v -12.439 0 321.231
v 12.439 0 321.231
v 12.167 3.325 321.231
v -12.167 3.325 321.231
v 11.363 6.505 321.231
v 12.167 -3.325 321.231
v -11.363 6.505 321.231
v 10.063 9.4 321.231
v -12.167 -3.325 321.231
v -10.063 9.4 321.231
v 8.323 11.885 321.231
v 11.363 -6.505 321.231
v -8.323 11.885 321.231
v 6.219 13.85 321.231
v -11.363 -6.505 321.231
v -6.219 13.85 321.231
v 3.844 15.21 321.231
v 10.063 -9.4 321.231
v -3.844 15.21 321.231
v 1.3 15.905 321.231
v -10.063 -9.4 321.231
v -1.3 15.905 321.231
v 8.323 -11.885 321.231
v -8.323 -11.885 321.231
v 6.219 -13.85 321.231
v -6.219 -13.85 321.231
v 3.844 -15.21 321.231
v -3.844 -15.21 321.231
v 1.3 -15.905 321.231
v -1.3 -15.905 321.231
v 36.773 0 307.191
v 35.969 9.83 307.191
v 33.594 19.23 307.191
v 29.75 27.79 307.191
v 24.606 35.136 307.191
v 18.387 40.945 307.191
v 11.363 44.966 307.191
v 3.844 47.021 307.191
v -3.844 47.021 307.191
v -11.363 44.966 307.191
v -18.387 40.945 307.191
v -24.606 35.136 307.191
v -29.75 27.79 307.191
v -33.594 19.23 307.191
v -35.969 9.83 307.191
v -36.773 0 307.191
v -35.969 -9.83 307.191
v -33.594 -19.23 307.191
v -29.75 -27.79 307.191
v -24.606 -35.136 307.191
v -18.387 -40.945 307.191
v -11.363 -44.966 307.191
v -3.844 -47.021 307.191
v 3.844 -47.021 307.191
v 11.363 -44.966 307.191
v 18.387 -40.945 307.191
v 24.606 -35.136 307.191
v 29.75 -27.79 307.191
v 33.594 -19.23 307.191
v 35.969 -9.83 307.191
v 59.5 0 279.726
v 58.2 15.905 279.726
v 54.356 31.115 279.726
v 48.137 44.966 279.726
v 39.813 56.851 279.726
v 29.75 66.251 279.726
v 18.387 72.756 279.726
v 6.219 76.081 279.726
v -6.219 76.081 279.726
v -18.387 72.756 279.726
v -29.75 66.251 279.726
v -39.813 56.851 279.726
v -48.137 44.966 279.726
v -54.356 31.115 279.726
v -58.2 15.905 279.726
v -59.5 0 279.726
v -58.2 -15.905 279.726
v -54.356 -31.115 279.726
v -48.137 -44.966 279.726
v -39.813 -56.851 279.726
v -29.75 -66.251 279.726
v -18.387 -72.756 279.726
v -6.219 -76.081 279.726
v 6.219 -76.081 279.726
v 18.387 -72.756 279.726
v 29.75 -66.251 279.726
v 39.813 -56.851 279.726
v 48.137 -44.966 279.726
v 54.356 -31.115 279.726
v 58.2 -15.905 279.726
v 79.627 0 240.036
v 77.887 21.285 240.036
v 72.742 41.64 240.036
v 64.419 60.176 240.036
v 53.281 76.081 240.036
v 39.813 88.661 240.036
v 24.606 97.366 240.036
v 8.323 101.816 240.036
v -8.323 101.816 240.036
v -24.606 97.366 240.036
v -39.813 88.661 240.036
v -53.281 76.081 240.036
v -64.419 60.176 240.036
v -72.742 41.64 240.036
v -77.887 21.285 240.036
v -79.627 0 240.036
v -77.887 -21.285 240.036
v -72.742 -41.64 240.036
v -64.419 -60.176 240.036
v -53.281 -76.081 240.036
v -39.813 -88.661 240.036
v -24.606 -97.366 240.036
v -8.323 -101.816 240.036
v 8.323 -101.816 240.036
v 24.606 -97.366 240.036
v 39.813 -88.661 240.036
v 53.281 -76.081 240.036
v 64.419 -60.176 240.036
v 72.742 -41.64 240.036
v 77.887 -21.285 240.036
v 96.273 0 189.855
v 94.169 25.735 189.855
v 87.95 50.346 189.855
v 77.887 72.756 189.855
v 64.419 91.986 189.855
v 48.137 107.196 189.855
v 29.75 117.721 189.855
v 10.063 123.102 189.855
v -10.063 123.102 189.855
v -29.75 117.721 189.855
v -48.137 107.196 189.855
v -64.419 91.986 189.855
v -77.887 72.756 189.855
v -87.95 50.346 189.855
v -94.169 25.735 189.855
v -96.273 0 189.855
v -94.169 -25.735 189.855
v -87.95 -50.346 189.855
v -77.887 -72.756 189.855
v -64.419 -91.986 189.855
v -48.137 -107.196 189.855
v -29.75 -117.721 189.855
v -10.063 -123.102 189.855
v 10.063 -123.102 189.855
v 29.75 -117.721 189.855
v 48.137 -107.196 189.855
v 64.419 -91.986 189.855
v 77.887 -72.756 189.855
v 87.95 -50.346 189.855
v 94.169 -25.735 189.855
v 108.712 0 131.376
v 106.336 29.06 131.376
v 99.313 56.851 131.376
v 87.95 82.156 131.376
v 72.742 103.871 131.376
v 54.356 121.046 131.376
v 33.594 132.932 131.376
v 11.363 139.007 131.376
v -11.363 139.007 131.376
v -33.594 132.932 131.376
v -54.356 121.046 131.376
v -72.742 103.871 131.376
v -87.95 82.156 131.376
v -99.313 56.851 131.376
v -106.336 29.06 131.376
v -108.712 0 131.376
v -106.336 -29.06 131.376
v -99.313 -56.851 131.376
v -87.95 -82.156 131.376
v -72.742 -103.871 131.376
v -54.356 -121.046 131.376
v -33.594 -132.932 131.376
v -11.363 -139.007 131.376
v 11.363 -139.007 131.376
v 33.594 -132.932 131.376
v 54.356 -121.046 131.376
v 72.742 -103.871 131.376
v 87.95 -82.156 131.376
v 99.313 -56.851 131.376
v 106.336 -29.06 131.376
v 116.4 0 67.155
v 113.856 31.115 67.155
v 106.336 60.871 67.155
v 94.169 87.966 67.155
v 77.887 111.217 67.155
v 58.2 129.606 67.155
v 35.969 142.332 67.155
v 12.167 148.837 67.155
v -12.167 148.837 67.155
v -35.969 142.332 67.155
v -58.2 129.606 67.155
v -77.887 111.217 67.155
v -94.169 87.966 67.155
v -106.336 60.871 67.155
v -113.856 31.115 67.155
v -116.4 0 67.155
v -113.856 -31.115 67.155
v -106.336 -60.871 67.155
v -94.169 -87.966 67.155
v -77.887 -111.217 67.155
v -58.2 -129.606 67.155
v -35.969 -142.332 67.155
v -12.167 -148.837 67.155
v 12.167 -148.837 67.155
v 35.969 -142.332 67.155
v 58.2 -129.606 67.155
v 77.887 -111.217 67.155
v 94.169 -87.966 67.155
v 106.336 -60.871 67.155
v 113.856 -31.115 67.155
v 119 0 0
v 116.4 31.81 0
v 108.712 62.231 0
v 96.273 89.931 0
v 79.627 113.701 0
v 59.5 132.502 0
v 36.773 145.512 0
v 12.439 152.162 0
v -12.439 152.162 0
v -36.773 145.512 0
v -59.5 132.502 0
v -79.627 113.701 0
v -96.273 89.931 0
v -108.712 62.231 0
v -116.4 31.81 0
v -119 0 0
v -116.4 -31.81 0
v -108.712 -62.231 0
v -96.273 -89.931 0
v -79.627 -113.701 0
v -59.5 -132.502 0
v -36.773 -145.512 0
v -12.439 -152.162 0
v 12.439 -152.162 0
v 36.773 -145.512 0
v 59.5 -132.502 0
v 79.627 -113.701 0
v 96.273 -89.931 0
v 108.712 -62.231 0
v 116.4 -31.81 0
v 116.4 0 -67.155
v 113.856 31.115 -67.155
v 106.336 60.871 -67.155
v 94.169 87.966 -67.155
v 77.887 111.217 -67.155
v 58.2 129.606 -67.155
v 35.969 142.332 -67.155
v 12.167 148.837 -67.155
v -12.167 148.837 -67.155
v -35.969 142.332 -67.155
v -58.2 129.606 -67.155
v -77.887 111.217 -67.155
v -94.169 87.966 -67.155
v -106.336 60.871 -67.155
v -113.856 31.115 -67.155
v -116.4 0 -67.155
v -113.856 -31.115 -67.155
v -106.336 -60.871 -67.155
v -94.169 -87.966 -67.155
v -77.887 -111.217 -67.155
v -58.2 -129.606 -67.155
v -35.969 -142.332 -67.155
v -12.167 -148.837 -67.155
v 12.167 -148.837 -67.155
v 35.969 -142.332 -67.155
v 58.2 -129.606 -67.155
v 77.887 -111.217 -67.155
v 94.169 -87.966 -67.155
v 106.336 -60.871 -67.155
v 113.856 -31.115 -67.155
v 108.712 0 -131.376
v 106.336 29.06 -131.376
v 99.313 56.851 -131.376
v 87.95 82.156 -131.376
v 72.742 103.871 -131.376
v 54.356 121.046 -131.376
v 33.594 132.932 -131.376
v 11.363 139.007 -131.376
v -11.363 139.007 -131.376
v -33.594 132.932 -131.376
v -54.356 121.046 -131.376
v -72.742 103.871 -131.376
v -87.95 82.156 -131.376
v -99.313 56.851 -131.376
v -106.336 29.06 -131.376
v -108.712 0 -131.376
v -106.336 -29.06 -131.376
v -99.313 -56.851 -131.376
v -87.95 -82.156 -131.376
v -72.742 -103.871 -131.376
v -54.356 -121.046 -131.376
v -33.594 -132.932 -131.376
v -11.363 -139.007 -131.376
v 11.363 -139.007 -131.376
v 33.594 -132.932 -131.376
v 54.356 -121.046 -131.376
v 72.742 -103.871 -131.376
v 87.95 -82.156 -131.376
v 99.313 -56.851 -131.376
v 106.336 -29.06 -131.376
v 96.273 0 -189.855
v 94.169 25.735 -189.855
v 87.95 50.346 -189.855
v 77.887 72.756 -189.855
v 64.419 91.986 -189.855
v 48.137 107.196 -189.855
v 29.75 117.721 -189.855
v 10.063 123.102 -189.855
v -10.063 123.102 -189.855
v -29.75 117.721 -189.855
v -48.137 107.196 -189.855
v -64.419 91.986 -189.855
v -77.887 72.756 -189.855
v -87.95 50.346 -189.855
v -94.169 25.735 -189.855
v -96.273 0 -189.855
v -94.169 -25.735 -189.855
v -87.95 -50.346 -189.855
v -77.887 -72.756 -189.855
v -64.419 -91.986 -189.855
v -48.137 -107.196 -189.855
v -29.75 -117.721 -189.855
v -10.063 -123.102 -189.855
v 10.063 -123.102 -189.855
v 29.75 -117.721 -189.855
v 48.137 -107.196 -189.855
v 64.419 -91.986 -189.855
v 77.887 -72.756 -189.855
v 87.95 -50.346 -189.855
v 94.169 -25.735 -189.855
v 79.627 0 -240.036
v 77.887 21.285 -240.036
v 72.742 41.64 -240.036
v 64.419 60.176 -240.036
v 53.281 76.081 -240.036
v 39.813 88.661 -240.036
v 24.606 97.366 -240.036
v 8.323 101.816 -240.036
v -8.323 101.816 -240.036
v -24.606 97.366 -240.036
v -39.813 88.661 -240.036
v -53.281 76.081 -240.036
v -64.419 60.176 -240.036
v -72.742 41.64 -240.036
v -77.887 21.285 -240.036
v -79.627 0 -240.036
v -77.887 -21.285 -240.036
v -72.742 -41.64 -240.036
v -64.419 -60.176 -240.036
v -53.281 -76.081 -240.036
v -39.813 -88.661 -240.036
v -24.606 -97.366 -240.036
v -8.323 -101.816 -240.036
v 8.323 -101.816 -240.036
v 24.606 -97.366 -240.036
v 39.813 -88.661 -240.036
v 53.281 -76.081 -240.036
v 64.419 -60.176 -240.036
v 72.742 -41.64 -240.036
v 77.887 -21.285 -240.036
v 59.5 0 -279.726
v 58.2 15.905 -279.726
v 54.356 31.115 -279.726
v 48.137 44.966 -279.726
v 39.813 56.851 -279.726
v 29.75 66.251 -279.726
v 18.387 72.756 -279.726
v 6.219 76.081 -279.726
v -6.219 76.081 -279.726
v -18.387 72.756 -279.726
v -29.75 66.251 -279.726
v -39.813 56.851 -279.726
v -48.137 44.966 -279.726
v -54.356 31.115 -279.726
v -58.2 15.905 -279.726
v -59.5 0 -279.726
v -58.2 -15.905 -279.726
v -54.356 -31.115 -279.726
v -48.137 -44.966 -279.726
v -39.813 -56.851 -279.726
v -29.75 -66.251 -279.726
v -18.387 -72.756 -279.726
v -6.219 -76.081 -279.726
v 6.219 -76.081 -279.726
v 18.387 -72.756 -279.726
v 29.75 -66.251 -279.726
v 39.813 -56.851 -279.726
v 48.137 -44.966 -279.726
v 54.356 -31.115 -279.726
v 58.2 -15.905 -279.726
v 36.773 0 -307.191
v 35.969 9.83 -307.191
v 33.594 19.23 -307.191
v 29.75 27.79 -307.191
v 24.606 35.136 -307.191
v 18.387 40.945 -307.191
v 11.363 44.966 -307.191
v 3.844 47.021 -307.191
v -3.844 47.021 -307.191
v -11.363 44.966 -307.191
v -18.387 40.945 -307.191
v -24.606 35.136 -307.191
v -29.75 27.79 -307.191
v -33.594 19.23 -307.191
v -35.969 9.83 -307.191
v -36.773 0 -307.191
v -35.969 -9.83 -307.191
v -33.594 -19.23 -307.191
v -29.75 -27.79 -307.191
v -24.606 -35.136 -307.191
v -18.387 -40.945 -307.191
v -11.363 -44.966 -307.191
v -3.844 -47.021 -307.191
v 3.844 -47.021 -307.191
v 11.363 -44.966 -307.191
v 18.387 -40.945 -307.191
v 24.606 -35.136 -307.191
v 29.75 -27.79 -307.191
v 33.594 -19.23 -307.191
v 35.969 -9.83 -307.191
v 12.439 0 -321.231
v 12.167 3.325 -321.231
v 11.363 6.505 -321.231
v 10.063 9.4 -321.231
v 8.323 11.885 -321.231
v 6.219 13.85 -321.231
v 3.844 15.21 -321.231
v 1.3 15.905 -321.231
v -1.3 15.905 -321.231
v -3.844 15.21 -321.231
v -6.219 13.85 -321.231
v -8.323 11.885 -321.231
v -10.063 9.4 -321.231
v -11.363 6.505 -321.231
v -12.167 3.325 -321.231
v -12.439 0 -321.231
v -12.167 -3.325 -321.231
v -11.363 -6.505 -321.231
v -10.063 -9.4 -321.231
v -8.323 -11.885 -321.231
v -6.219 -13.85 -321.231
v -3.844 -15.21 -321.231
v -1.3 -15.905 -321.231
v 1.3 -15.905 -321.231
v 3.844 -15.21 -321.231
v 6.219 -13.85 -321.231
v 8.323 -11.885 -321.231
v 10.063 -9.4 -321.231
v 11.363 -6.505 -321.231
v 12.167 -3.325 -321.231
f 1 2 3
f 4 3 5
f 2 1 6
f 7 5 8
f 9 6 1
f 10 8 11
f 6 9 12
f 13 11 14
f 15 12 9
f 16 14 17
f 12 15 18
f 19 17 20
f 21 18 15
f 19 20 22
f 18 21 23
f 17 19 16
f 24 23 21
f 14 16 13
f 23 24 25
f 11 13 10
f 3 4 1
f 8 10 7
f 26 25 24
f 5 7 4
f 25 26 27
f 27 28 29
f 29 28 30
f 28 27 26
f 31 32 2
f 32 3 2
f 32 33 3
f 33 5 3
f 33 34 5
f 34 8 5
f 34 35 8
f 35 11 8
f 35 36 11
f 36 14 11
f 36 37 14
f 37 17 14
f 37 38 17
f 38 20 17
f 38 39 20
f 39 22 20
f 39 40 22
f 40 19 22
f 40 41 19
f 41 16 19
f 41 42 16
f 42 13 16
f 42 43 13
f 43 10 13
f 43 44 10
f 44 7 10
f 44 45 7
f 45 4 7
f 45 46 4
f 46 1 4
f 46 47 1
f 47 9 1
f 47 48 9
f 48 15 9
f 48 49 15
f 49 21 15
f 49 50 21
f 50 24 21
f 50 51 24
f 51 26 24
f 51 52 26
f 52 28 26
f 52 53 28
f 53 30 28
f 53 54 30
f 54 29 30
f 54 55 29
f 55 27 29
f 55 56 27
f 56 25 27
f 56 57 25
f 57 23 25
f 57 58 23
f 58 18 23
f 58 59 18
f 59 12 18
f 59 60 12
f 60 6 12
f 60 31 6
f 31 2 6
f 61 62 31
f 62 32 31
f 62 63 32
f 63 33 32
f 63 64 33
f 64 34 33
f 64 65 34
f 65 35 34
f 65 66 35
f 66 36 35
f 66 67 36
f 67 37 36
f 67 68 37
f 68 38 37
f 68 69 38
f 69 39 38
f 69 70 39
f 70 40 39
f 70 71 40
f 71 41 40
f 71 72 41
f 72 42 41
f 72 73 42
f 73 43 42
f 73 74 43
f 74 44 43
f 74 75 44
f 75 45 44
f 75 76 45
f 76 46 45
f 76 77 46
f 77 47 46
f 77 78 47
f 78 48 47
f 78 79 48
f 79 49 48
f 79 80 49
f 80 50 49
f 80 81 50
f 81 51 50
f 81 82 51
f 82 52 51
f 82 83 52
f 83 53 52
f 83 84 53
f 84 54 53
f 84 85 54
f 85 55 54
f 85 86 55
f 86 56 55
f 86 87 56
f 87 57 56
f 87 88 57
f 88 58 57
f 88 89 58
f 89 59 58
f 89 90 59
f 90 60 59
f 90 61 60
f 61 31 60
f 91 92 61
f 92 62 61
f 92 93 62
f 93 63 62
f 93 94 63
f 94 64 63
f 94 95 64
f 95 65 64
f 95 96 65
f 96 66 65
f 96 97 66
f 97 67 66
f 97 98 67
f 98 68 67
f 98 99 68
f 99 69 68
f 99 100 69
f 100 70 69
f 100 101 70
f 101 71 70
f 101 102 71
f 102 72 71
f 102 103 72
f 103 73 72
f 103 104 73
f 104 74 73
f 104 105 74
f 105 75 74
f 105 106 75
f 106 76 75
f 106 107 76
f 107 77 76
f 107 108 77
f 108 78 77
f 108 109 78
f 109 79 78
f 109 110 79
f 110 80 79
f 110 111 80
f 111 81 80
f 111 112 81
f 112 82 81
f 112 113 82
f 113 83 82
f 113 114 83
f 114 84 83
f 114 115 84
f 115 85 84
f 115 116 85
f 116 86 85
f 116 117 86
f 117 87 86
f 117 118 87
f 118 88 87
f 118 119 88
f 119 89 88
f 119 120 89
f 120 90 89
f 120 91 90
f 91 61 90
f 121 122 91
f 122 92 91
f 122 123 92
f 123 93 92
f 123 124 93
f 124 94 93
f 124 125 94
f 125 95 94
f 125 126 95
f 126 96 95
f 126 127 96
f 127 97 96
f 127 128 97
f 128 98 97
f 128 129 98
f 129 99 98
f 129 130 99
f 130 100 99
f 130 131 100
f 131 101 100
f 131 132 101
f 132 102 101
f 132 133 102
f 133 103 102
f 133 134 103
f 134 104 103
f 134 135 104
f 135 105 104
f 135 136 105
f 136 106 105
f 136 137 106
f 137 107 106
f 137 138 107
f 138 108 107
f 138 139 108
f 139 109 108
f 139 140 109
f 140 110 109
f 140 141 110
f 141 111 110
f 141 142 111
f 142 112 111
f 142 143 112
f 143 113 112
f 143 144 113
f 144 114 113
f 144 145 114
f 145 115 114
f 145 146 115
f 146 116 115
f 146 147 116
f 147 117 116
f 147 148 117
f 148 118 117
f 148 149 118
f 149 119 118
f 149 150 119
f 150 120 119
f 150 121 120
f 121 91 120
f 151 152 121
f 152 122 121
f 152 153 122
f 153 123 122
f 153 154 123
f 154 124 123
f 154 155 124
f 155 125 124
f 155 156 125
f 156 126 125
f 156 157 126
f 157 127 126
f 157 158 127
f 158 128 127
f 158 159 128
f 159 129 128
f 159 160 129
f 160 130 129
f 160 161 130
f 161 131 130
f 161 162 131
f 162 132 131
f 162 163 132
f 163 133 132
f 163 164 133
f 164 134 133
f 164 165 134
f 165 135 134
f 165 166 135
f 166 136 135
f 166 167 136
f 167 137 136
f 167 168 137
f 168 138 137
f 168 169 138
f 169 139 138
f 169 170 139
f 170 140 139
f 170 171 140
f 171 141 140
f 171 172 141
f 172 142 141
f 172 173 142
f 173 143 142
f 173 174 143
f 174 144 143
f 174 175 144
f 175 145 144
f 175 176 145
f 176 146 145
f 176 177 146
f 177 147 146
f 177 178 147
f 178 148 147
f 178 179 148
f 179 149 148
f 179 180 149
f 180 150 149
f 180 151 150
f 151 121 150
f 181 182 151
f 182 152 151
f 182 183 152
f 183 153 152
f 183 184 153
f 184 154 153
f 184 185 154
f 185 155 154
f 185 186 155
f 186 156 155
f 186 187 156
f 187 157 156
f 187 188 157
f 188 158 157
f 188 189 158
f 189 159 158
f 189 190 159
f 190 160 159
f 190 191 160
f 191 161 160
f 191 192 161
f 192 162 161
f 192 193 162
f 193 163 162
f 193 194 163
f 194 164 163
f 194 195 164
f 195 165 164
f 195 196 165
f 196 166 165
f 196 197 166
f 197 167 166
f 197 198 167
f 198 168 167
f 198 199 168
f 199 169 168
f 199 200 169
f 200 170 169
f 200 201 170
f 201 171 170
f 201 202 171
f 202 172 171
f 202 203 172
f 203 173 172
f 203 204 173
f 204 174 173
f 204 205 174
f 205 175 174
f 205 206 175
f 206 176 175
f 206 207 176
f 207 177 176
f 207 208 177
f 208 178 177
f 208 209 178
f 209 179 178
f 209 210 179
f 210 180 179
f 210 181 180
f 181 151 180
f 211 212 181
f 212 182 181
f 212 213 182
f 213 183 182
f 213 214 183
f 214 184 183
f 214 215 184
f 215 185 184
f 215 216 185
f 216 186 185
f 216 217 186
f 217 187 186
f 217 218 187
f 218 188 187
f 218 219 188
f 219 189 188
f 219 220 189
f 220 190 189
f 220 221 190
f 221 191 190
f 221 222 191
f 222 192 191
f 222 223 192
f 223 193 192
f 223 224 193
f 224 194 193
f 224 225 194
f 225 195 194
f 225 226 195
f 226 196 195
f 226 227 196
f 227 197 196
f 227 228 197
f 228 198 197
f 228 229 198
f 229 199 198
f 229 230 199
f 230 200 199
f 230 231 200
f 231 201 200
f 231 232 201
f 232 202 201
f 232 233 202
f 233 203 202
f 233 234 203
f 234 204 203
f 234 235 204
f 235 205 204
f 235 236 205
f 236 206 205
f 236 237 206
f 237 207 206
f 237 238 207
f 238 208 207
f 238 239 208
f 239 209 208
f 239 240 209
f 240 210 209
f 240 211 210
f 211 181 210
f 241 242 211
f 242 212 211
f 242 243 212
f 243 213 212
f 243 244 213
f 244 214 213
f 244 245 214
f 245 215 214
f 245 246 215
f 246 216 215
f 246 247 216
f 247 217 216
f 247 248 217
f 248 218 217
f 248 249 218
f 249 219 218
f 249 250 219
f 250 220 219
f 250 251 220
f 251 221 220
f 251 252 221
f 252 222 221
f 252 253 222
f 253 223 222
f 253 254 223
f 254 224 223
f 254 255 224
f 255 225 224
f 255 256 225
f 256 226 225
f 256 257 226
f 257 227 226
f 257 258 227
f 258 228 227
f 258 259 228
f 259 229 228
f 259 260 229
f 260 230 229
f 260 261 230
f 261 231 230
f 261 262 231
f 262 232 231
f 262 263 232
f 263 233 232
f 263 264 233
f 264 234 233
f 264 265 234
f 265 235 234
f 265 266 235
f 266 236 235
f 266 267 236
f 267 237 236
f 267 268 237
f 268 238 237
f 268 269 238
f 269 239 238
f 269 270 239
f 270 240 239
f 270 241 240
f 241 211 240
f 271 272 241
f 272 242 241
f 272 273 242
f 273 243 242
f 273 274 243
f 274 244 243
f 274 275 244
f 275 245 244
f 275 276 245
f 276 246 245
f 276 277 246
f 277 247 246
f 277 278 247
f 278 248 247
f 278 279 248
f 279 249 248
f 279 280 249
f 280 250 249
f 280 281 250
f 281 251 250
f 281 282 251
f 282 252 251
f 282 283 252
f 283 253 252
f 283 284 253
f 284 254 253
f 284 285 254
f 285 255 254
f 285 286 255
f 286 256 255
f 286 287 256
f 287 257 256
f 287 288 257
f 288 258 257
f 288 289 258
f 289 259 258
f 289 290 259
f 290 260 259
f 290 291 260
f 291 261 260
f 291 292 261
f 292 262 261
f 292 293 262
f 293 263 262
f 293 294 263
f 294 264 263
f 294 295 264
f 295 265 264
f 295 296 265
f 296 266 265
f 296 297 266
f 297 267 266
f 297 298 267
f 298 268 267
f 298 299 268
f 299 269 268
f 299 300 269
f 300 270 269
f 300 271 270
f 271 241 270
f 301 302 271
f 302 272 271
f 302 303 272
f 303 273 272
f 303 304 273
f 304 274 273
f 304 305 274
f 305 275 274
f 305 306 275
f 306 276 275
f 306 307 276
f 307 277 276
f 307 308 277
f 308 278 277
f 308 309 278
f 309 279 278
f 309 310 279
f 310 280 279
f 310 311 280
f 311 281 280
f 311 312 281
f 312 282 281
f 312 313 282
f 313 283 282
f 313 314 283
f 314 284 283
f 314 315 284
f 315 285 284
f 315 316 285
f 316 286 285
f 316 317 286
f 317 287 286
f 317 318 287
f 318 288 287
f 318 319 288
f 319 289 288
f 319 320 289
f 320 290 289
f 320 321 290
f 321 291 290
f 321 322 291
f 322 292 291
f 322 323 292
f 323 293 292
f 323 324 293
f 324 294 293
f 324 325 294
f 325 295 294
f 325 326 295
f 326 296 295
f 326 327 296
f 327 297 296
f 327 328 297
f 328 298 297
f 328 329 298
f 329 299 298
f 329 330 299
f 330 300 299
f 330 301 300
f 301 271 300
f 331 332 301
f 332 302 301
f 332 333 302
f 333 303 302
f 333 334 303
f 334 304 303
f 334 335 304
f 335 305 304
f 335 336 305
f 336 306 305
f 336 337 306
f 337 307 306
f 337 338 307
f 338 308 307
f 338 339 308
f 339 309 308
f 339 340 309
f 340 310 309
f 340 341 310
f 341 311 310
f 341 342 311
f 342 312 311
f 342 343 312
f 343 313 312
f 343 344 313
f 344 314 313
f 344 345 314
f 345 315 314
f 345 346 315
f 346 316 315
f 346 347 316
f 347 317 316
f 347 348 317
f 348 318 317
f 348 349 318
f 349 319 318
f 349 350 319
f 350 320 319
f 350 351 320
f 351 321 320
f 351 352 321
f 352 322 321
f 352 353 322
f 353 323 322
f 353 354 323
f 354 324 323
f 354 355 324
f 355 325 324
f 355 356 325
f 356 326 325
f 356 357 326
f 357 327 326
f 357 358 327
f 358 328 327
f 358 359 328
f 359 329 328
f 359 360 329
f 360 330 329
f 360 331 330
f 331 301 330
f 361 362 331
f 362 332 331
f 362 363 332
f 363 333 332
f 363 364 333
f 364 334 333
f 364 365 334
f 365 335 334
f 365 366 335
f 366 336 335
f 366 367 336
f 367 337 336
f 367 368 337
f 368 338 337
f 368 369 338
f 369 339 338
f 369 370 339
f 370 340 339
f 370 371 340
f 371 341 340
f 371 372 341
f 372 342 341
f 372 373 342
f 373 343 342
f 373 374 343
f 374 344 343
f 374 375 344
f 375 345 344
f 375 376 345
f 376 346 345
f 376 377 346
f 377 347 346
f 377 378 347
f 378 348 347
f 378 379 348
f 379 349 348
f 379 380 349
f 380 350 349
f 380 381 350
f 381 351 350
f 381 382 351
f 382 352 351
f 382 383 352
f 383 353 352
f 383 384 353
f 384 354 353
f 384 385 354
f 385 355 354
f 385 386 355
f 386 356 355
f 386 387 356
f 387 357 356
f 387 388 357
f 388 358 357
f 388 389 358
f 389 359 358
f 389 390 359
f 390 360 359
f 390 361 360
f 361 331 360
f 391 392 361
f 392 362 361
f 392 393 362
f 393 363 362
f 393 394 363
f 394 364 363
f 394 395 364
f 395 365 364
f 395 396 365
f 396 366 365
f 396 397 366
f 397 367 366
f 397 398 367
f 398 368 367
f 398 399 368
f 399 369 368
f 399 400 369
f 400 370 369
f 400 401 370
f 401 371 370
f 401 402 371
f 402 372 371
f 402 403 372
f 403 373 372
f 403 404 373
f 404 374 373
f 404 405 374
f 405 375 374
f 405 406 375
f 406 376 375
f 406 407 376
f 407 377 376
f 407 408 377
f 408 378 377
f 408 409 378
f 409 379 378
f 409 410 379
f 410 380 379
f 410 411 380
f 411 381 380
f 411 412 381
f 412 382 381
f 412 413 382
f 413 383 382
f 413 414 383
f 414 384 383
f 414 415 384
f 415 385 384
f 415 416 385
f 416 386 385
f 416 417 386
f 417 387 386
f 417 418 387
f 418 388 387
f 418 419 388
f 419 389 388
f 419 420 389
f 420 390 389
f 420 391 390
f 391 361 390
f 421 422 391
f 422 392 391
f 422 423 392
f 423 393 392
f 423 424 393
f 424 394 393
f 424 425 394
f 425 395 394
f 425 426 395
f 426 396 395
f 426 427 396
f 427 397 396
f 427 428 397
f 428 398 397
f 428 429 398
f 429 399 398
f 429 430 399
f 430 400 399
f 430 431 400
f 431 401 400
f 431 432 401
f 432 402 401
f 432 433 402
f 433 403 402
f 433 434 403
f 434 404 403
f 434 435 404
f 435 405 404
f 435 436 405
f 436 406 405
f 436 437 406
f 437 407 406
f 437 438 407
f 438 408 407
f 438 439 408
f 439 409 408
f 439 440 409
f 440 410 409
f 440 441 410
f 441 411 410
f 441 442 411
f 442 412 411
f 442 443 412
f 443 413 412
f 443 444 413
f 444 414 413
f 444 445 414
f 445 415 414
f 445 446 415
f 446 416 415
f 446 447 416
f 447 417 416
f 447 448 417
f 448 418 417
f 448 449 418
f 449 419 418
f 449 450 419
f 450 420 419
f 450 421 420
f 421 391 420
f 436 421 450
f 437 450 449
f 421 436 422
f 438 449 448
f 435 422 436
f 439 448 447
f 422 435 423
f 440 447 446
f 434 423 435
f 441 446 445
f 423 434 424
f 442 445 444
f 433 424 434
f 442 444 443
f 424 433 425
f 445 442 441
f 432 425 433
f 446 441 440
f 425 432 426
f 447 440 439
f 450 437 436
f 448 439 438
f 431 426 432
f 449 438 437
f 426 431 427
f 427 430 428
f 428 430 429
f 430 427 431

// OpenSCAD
// Generated by SolidPython 1.0.1 on 2020-07-29 00:46:47


scale(v = [7, 9, 19]) {
	sphere(r = 17);
}
/***********************************************
*********      SolidPython code:      **********
************************************************
 
# import packages: SolidPython
from solid import *
from solid.utils import *
from itertools import chain, combinations, permutations


class Resize:

    def __init__(self, scad_file):
        self.scad_file = scad_file
        #self.scad_file = import_scad(scad_file)
        # cone/cylinder param:
        self.r1 = 0
        self.r2 = 0
        self.h = 0
        # rectangular prism param:
        self.w = 0
        self.l = 0
        # ellipse param:
        self.r = 0

    # import OpenScad code (file name corresponds to shape)


    # classify shape + parameters
    def assign(self, param1, param2, param3):
        if self.scad_file == 'cone.scad':
            self.r1 = param1
            self.r2 = param2
            self.h = param3
        elif self.scad_file == 'cylinder.scad':
            self.r1 = param1
            self.r2 = param2
            self.h = param3
        elif self.scad_file == 'rectangularPrism.scad':
            self.h = param1
            self.l = param2
            self.w = param3
        else:
            self.r = param1
            self.h = param2

    # resize parameters
    def iterate(self):
        x = range(3, 20, 2)
        i = 1
        if self.scad_file == 'cone.scad':
            tempList = list(permutations(x, 2))
            for temp in tempList:
                param1 = temp[0]
                param2 = temp[1]
                filepath = 'produced_scad_files/' + 'cone' + str(param1) + '_' + str(param2) + '_' + '.scad'
                scad_render_to_file(cylinder(h=param1, r1=param2, r2=0), filepath)

        elif self.scad_file == 'cylinder.scad':
            tempList = list(permutations(x, 3))
            for temp in tempList:
                param1 = temp[0]
                param2 = temp[1]
                filepath = 'produced_scad_files/' + 'cylinder' + str(param1) + '_' + str(param2) + '_' + '.scad'
                scad_render_to_file(cylinder(h=param1, r1=param2, r2=param2), filepath)

        elif self.scad_file == 'rectangularPrism.scad':
            tempList = list(permutations(x, 3))
            for temp in tempList:
                param1 = temp[0]
                param2 = temp[1]
                param3 = temp[2]
                filepath = 'produced_scad_files/' + 'rectangularPrism' + str(param1) + '_' + str(param2) + '_' + str(
                    param3) + '.scad'
                scad_render_to_file(cube(size=(param1, param2, param3)), filepath)

        elif self.scad_file == 'ellipse.scad':
            tempList = list(permutations(x, 4))
            for temp in tempList:
                param1 = temp[0]
                param2 = temp[1]
                param3 = temp[2]
                param4 = temp[3]
                filepath = 'produced_scad_files/' + 'ellipse' + str(param1) + '_' + str(param2) + '_' + str(param3) + '_' + str(param4) + '.scad'
                scad_render_to_file(scale([param1, param2, param3])(sphere(r=param4)), filepath)

    def render_to_scadfile(self):
        scad_render_to_file(scad, 'example.scad') 
 
************************************************/
